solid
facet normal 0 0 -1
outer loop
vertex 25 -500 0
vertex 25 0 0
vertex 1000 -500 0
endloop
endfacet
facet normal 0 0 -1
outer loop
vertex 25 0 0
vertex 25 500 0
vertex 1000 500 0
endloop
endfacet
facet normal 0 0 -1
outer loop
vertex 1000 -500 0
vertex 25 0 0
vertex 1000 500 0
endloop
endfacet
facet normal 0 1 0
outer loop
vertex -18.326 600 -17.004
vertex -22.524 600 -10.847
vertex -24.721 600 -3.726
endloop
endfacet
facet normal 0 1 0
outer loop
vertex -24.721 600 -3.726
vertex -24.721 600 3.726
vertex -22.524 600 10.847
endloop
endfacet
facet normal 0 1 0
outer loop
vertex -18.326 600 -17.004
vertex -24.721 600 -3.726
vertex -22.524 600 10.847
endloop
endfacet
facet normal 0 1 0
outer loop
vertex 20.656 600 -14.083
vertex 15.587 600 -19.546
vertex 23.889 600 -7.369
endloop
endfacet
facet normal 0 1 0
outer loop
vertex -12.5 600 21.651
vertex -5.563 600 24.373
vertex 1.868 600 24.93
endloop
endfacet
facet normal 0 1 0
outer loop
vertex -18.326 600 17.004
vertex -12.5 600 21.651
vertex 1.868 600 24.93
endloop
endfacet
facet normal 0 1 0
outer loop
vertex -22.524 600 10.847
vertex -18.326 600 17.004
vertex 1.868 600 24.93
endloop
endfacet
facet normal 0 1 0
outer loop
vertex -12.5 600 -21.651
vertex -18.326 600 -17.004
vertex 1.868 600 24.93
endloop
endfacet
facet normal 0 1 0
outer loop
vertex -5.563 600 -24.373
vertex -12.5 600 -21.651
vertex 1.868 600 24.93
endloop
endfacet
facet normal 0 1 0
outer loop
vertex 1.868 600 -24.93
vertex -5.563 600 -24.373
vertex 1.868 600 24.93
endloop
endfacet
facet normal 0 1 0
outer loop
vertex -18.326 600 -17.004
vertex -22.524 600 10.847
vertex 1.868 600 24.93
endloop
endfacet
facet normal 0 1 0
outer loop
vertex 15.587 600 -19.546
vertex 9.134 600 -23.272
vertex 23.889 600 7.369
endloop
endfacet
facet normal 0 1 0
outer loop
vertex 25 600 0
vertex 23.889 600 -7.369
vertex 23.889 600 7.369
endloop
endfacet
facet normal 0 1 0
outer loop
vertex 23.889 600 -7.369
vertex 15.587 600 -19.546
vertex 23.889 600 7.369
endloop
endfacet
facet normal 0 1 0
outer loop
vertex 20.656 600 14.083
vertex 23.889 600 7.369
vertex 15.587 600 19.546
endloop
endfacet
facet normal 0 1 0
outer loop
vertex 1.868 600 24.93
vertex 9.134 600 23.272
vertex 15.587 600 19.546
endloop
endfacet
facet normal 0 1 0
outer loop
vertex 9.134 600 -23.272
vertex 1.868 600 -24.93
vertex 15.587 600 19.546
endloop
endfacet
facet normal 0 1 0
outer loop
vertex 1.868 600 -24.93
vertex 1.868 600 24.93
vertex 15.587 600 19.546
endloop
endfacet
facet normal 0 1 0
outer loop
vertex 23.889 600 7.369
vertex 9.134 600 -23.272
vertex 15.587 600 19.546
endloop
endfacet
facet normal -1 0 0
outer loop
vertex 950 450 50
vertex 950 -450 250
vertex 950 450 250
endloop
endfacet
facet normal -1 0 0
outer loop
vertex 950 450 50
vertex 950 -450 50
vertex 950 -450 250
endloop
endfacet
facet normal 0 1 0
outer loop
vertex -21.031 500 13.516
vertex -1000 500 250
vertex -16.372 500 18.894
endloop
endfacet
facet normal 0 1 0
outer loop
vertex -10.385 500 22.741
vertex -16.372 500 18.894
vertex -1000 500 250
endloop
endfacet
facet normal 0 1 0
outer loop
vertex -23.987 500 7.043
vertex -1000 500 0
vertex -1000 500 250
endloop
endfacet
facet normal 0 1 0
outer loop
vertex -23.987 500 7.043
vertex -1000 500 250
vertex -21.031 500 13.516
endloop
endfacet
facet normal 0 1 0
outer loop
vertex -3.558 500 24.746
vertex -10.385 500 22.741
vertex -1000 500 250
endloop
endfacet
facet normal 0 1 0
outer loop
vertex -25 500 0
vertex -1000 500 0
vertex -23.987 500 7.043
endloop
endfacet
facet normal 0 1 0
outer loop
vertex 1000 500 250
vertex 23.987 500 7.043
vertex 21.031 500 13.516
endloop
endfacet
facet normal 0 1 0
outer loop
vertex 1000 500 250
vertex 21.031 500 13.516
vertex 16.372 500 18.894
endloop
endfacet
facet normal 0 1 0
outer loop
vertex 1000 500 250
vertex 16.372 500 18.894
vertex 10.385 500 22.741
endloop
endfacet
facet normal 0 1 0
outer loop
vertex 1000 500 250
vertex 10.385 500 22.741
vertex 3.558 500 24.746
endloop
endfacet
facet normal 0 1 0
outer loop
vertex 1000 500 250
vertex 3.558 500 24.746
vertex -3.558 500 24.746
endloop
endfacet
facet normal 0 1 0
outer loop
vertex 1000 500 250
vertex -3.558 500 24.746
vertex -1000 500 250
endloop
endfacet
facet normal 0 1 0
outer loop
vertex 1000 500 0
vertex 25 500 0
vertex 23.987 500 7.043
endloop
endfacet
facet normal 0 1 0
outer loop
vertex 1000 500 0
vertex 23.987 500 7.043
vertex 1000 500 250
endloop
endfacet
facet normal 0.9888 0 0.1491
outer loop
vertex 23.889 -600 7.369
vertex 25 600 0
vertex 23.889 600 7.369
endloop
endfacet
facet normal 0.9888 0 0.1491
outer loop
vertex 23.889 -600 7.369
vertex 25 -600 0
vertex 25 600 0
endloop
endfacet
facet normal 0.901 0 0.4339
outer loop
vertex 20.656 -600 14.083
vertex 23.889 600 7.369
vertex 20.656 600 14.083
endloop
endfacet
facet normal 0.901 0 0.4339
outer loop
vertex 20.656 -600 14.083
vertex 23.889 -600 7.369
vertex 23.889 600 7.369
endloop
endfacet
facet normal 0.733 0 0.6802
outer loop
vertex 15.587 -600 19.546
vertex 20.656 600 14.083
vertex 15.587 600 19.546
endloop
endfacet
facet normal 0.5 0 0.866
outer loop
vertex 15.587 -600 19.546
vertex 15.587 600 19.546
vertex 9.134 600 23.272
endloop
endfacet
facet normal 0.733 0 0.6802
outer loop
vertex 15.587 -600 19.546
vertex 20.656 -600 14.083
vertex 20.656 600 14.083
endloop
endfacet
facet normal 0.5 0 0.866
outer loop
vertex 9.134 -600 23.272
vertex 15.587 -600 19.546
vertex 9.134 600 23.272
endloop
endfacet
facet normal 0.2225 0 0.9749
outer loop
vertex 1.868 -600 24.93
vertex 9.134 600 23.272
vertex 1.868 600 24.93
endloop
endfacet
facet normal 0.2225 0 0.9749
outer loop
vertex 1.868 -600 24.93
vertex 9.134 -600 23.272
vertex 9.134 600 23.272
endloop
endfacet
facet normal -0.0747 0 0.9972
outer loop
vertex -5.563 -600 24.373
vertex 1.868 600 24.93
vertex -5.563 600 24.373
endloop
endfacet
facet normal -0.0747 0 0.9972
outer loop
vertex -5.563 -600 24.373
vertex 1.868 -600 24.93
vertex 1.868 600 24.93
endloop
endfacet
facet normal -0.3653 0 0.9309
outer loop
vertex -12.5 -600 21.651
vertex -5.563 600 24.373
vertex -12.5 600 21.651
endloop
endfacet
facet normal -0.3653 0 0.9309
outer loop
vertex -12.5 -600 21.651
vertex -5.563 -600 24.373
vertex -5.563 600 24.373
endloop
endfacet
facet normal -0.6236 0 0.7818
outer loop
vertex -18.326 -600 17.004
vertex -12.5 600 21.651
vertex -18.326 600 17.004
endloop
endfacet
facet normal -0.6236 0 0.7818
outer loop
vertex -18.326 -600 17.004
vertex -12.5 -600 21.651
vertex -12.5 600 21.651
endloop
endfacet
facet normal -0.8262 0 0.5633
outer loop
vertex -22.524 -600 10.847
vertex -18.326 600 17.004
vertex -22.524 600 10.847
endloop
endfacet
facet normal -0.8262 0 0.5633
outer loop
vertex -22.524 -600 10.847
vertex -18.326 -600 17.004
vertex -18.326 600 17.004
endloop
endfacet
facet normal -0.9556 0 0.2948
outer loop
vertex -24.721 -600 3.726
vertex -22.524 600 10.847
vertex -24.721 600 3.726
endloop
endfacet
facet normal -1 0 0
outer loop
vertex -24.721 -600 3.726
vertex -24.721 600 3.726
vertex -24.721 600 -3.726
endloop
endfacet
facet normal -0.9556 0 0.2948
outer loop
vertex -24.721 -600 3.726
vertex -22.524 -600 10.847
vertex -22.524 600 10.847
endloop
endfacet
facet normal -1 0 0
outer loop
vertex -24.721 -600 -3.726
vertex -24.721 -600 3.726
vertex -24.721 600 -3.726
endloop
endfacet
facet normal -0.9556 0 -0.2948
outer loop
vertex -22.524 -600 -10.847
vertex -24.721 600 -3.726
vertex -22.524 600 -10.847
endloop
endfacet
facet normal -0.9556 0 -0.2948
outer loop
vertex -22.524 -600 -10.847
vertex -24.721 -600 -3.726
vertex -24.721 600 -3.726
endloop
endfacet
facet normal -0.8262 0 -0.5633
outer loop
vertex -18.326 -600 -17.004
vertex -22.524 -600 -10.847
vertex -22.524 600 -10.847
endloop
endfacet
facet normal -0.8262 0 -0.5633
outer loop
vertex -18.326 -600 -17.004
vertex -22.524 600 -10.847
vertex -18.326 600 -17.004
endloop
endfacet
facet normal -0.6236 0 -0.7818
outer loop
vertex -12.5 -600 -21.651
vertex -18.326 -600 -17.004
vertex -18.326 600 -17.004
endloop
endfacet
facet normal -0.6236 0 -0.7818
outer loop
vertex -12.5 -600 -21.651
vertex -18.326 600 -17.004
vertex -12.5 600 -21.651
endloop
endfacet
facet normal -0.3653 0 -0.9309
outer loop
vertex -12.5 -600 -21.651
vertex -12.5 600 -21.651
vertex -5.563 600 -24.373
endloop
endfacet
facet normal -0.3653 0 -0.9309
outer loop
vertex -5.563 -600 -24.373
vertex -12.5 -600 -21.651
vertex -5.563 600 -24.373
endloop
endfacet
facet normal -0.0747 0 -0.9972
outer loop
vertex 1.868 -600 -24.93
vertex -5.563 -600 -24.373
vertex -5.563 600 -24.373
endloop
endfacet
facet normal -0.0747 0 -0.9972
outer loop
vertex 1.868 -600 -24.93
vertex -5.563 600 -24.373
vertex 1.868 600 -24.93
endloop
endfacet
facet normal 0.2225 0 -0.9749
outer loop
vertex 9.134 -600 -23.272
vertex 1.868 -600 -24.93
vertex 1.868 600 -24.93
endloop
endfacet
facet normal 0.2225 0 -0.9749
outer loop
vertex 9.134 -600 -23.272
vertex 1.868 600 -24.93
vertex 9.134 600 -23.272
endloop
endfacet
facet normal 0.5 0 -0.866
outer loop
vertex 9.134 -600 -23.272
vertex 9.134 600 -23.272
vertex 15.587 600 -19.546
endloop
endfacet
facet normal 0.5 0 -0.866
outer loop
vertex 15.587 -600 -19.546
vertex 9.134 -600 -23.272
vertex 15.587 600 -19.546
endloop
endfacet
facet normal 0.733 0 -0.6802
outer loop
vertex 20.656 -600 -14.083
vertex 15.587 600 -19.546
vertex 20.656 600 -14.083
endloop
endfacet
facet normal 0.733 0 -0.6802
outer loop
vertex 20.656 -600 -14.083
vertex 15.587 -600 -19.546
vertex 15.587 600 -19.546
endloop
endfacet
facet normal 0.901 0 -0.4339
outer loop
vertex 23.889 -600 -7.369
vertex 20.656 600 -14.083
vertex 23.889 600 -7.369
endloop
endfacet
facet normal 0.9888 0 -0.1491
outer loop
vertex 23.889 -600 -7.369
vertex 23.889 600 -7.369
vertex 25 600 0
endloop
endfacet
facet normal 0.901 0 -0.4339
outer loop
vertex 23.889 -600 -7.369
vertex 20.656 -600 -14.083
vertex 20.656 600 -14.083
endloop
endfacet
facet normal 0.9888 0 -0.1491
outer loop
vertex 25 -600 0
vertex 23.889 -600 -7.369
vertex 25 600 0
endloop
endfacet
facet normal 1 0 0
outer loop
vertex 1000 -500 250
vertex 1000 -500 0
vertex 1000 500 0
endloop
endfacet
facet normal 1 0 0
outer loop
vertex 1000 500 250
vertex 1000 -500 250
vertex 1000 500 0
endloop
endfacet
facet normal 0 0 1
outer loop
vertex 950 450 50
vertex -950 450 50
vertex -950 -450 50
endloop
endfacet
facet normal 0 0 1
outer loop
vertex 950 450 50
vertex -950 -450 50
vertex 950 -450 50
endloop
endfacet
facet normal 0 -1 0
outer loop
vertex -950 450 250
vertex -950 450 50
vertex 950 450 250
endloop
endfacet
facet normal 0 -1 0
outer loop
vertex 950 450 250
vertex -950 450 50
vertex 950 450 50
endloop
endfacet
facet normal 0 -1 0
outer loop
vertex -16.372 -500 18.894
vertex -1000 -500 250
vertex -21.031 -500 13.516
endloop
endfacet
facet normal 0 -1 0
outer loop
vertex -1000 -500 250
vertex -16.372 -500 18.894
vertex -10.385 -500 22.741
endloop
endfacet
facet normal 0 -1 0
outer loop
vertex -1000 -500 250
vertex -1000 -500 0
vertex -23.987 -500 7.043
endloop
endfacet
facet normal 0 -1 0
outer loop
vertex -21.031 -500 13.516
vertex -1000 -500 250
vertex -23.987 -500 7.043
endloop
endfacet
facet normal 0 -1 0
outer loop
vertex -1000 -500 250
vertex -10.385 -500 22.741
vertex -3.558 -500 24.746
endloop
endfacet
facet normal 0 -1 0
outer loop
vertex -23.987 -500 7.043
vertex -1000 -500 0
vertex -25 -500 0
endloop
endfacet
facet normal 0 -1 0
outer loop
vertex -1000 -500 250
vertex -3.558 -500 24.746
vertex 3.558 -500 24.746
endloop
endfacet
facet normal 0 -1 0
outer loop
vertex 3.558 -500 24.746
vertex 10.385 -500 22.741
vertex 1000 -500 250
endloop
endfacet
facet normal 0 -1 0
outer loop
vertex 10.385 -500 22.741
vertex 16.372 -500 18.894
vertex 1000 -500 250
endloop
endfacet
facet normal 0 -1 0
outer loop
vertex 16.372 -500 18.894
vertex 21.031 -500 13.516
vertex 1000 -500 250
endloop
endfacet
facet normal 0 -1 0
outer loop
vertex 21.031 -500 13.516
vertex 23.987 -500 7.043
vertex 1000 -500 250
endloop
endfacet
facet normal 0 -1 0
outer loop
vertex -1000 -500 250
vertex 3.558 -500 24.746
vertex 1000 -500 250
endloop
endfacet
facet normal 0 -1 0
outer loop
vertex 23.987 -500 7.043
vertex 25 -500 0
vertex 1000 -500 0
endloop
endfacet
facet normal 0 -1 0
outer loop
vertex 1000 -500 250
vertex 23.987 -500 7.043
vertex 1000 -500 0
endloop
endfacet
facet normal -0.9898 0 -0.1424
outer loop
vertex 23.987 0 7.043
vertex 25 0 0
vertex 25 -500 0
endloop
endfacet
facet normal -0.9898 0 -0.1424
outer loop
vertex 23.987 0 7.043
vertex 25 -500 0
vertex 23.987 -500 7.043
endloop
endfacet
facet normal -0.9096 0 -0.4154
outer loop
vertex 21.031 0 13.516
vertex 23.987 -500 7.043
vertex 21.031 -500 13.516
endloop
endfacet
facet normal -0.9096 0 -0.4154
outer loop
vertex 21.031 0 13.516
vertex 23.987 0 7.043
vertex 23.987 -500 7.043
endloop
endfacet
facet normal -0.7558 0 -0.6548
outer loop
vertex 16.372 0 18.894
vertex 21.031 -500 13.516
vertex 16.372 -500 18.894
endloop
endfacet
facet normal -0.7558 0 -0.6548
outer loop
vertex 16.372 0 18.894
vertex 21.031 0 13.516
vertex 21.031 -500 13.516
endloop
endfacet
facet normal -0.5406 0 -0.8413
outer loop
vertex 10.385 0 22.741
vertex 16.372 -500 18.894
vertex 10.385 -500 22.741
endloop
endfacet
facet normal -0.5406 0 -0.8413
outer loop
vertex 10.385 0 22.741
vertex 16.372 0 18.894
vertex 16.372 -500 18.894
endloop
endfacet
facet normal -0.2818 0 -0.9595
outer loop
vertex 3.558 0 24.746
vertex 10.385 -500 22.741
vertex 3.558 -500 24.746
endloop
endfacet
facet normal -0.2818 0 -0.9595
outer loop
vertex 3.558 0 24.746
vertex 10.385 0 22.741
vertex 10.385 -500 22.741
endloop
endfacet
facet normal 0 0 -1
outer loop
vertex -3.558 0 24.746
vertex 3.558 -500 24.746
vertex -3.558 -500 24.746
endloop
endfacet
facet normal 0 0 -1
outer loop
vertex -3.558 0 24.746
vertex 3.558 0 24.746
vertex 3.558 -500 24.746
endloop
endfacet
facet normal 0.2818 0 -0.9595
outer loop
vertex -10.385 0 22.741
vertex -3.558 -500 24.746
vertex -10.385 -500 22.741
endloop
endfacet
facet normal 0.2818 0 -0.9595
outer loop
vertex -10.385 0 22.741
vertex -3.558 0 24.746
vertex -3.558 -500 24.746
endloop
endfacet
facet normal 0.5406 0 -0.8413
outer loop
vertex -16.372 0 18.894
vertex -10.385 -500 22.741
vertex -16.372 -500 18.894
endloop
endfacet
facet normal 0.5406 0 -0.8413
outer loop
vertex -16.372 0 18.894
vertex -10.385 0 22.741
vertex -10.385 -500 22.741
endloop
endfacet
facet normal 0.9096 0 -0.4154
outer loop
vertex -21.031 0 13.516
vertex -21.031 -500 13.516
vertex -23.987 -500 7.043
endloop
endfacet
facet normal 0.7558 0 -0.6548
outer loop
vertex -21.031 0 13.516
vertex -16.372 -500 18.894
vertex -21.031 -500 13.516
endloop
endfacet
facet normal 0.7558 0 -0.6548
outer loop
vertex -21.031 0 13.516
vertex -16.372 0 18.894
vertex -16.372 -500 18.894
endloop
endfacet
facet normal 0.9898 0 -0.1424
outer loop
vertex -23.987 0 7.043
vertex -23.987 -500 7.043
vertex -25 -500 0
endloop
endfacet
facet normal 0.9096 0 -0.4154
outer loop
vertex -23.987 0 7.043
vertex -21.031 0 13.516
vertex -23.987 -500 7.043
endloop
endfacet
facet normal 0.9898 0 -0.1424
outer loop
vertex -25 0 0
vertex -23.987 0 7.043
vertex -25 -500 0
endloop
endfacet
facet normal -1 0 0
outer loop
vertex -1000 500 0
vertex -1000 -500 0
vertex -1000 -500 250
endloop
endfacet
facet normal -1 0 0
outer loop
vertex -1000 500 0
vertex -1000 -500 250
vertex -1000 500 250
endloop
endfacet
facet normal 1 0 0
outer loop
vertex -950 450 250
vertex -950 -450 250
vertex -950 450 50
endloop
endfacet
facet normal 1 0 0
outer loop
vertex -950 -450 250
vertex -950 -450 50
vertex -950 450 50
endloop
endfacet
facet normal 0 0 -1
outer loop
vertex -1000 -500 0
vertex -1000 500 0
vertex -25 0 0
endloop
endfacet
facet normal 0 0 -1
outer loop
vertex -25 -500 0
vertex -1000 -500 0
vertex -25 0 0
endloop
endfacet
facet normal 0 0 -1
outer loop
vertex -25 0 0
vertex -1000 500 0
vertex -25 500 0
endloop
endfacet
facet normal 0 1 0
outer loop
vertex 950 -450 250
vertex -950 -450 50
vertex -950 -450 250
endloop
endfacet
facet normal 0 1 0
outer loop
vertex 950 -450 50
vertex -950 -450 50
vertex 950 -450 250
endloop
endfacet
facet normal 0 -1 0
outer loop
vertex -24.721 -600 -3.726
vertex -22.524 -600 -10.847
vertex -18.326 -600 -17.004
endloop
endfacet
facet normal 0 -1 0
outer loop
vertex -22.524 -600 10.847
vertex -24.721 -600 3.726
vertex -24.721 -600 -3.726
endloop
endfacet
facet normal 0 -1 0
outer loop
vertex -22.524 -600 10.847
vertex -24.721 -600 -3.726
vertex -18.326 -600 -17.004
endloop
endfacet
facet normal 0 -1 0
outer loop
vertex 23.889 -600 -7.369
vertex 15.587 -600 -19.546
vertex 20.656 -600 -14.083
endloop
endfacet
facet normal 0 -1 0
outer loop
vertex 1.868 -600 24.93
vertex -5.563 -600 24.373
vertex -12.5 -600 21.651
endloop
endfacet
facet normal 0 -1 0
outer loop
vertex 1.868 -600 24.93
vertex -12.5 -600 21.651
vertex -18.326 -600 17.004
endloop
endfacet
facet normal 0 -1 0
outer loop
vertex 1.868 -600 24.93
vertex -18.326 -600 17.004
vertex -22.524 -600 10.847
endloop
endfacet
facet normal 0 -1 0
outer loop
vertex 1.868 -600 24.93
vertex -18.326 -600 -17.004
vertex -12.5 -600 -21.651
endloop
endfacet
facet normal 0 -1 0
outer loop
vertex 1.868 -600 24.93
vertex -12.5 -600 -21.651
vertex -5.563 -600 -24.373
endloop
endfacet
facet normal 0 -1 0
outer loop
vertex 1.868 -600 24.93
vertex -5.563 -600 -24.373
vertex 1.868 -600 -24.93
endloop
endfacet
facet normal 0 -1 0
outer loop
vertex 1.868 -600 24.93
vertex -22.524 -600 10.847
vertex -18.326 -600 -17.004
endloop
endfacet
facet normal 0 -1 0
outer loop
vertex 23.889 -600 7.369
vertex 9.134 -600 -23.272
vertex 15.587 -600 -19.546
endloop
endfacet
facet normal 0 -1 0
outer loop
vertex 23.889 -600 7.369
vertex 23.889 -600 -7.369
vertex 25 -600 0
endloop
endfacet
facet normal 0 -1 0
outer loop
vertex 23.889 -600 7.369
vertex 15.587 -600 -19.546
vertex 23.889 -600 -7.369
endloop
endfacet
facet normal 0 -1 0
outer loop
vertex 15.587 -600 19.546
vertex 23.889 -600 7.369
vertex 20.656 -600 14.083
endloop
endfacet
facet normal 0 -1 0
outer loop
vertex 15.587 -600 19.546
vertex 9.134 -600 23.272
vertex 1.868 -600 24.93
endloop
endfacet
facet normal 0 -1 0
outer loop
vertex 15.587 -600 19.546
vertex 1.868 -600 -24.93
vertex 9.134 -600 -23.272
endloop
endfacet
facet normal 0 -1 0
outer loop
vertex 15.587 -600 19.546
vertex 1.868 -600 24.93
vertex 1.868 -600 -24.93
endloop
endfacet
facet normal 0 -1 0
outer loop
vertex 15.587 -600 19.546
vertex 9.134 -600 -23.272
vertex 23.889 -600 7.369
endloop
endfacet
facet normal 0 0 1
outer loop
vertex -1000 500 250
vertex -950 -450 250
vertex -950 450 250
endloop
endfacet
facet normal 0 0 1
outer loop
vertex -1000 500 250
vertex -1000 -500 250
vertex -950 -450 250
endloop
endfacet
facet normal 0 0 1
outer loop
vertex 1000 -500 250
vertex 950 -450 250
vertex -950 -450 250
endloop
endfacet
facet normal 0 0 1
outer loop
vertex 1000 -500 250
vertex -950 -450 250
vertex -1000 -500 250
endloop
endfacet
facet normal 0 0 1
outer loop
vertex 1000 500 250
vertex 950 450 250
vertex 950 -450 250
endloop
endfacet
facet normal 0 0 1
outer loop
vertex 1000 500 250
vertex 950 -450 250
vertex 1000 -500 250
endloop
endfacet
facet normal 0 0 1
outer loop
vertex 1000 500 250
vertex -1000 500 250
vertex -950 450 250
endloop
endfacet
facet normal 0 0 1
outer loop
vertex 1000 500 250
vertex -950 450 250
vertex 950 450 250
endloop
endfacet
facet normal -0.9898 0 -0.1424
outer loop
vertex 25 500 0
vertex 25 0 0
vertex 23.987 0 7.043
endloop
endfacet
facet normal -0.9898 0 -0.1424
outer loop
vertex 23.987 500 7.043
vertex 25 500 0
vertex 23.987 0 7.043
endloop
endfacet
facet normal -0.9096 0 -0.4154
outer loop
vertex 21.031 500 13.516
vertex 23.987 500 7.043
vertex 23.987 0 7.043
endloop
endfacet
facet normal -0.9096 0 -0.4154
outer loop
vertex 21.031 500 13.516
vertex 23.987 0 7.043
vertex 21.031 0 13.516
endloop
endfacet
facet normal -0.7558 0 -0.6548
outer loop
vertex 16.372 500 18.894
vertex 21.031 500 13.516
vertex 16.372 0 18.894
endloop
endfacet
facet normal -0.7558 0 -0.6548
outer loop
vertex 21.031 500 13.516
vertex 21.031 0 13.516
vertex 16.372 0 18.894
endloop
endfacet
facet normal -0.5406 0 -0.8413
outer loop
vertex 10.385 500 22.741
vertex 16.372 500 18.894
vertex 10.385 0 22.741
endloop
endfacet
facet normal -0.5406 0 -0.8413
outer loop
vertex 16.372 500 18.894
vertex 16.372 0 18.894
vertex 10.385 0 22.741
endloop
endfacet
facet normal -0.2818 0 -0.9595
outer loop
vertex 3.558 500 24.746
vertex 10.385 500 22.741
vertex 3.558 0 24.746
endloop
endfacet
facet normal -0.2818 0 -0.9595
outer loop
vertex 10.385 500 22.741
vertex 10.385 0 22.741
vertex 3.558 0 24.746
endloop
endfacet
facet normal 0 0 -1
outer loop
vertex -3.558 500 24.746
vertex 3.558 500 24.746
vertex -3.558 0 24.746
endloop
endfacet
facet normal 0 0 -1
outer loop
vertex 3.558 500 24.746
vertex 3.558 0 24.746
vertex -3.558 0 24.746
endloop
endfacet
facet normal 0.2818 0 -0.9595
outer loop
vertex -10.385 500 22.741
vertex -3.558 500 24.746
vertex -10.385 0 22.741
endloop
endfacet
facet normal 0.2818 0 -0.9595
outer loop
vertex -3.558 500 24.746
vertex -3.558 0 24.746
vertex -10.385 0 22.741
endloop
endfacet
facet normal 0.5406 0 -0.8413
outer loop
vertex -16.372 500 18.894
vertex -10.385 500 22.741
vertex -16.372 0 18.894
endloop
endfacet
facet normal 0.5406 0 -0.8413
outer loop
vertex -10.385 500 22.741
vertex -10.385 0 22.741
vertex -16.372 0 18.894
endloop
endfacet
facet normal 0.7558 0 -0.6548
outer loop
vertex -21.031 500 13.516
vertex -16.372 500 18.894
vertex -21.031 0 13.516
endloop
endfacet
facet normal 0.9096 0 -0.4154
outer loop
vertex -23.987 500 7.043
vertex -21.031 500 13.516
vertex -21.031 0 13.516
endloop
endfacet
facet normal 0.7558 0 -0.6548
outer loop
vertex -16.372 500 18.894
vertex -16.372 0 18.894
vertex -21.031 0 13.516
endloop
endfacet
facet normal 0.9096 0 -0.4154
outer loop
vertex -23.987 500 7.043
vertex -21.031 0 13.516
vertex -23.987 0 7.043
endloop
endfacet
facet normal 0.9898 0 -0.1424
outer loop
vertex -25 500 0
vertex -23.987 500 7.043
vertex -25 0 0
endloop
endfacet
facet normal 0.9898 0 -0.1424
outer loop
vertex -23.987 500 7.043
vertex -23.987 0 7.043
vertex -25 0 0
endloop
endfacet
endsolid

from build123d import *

# Parameters (mm, degrees)
F0_W          = 2000
F0_H          = 1000
F1_DEPTH      = 250
F2_T          = -50
F3_R          = 25
F4_DEPTH      = 500.001
F4_DEPTH_BACK = 500.001
F5_DEPTH      = 600
F5_DEPTH_BACK = 600


with BuildPart() as f1:
    # F0 (on Top) → F1 (new body)
    with BuildSketch(Plane.XY):
        Rectangle(F0_W, F0_H)
    extrude(amount=F1_DEPTH)

    # F2
    f2_openings = [f1.faces().sort_by_distance(p)[0] for p in [
        (0, 0, 250),
    ]]
    offset(amount=F2_T, openings=f2_openings)

    # F3 (on Front) → F4 (cut, two sides)
    with BuildSketch(Plane.XZ) as f4_sk:
        Circle(F3_R)
    extrude(amount=-F4_DEPTH, mode=Mode.SUBTRACT)
    extrude(f4_sk.sketch, amount=F4_DEPTH_BACK, mode=Mode.SUBTRACT)


with BuildPart() as f5:
    # F3 (on Front) → F5 (new body, two sides)
    with BuildSketch(Plane.XZ) as f5_sk:
        Circle(F3_R)
    extrude(amount=F5_DEPTH)
    extrude(f5_sk.sketch, amount=-F5_DEPTH_BACK)


solid = Compound([f1.part, f5.part])
